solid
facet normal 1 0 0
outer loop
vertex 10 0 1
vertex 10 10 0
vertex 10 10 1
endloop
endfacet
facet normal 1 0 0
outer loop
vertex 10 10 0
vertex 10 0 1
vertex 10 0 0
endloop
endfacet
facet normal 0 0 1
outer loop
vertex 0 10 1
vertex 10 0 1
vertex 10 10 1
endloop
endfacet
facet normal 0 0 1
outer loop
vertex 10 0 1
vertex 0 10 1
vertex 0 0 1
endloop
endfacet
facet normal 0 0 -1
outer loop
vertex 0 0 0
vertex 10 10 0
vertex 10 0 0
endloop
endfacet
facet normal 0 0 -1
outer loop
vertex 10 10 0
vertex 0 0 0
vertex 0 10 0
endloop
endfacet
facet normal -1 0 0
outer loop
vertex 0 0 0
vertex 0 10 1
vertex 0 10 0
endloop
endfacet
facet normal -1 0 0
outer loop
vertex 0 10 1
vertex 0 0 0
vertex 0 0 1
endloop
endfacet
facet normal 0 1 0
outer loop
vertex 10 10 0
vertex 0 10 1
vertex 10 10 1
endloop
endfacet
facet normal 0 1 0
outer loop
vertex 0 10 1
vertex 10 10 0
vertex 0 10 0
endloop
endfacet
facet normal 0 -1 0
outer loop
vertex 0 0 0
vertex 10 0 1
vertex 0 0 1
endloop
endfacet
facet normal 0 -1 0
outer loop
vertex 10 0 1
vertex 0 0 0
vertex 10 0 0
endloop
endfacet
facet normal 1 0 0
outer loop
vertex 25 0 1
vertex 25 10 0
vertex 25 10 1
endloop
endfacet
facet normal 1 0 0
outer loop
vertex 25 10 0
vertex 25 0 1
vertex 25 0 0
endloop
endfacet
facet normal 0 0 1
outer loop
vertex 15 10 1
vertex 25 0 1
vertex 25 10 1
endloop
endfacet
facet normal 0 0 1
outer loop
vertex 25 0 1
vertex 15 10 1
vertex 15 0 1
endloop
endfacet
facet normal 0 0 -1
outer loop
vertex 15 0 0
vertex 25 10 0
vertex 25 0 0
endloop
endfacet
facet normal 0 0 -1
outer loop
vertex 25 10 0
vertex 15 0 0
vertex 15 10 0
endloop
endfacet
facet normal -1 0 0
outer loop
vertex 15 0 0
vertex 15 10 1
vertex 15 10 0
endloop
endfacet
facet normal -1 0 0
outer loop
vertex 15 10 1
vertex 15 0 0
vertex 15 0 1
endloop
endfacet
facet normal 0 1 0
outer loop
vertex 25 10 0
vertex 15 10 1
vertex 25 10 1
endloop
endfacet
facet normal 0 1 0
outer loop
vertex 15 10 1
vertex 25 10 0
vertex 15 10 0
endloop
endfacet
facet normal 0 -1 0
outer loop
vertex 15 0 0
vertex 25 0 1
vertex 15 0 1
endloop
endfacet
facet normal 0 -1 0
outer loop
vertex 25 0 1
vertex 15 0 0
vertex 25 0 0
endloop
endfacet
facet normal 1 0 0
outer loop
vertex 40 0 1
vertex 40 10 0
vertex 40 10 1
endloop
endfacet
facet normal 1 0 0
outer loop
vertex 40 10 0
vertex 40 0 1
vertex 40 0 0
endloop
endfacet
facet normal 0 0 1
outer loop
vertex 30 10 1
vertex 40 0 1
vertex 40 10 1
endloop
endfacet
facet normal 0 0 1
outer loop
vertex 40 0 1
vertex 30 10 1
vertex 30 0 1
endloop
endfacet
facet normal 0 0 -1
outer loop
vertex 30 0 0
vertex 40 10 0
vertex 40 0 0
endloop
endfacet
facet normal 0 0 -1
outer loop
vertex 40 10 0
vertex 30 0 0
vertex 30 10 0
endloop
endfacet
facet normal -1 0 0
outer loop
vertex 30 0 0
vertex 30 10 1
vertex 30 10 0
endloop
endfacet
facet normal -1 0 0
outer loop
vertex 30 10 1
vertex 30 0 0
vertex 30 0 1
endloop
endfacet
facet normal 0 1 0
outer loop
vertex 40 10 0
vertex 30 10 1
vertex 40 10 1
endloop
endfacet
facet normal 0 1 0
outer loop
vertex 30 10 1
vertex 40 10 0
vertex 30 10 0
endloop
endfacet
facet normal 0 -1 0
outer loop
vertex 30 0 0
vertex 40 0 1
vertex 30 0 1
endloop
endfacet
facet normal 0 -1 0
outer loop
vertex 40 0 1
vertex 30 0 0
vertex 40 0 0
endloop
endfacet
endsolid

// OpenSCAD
// file: wood.scad
include <tools.scad>

//Draw a board and displays its dimensions
module board(length, width, thickness, quiet=true, name=""){
	cube([length, width, thickness]);
	
	if(!quiet){
		board=(name!="")?str("Board - ",name,":"):"Board:";
		echo(str(board,length,"x",width,"x",thickness," ",unit));
	}
}

board(10, 10, 1, false);

translate([15, 0, 0]) board(10, 10, 1, false, "left side");
// file: tools.scad
unit="cm";

//Draw reference axis
module drawAxis(s=1){
	rotate([0, 90, 0]) color("Crimson") cylinder(h=s, r1=s/20, r2=s/20, $fn=10);
	rotate([-90, 0, 0]) color("LimeGreen") cylinder(h=s, r1=s/20, r2=s/20, $fn=10);
	color("DodgerBlue") cylinder(h=s, r1=s/20, r2=s/20, $fn=10);
}

// drawAxis(1);
// 
// translate([2, 0, 0]) rotate([0, -45, 0]) drawAxis(1);
// 
// rotate([0, -45, 0]) translate([2, 0, 0]) drawAxis(1);
// main file
include <tools.scad>
use <wood.scad>

module board_darkWood(length, width, thickness, name=""){
	color("SaddleBrown") board(length, width, thickness);
	
	board=(name!="")?str("Board - ",name):"Board";
	echo(str(board,", dark wood: ",length,"x",width,"x",thickness," ",unit));
}

board_darkWood(10, 10, 1);

module board_greyWood(length, width, thickness, name=""){
	color("OldLace") board(length, width, thickness);
	
	board=(name!="")?str("Board - ",name):"Board";
	echo(str(board,", grey wood: ",length,"x",width,"x",thickness," ",unit));
}

translate([15, 0, 0]) board_greyWood(10, 10, 1);

module board_lightWood(length, width, thickness, name=""){
	color("BlanchedAlmond") board(length, width, thickness);
	
	board=(name!="")?str("Board - ",name):"Board";
	echo(str(board,", light wood: ",length,"x",width,"x",thickness," ",unit));
}

translate([30, 0, 0]) board_lightWood(10, 10, 1, "sample 3");
